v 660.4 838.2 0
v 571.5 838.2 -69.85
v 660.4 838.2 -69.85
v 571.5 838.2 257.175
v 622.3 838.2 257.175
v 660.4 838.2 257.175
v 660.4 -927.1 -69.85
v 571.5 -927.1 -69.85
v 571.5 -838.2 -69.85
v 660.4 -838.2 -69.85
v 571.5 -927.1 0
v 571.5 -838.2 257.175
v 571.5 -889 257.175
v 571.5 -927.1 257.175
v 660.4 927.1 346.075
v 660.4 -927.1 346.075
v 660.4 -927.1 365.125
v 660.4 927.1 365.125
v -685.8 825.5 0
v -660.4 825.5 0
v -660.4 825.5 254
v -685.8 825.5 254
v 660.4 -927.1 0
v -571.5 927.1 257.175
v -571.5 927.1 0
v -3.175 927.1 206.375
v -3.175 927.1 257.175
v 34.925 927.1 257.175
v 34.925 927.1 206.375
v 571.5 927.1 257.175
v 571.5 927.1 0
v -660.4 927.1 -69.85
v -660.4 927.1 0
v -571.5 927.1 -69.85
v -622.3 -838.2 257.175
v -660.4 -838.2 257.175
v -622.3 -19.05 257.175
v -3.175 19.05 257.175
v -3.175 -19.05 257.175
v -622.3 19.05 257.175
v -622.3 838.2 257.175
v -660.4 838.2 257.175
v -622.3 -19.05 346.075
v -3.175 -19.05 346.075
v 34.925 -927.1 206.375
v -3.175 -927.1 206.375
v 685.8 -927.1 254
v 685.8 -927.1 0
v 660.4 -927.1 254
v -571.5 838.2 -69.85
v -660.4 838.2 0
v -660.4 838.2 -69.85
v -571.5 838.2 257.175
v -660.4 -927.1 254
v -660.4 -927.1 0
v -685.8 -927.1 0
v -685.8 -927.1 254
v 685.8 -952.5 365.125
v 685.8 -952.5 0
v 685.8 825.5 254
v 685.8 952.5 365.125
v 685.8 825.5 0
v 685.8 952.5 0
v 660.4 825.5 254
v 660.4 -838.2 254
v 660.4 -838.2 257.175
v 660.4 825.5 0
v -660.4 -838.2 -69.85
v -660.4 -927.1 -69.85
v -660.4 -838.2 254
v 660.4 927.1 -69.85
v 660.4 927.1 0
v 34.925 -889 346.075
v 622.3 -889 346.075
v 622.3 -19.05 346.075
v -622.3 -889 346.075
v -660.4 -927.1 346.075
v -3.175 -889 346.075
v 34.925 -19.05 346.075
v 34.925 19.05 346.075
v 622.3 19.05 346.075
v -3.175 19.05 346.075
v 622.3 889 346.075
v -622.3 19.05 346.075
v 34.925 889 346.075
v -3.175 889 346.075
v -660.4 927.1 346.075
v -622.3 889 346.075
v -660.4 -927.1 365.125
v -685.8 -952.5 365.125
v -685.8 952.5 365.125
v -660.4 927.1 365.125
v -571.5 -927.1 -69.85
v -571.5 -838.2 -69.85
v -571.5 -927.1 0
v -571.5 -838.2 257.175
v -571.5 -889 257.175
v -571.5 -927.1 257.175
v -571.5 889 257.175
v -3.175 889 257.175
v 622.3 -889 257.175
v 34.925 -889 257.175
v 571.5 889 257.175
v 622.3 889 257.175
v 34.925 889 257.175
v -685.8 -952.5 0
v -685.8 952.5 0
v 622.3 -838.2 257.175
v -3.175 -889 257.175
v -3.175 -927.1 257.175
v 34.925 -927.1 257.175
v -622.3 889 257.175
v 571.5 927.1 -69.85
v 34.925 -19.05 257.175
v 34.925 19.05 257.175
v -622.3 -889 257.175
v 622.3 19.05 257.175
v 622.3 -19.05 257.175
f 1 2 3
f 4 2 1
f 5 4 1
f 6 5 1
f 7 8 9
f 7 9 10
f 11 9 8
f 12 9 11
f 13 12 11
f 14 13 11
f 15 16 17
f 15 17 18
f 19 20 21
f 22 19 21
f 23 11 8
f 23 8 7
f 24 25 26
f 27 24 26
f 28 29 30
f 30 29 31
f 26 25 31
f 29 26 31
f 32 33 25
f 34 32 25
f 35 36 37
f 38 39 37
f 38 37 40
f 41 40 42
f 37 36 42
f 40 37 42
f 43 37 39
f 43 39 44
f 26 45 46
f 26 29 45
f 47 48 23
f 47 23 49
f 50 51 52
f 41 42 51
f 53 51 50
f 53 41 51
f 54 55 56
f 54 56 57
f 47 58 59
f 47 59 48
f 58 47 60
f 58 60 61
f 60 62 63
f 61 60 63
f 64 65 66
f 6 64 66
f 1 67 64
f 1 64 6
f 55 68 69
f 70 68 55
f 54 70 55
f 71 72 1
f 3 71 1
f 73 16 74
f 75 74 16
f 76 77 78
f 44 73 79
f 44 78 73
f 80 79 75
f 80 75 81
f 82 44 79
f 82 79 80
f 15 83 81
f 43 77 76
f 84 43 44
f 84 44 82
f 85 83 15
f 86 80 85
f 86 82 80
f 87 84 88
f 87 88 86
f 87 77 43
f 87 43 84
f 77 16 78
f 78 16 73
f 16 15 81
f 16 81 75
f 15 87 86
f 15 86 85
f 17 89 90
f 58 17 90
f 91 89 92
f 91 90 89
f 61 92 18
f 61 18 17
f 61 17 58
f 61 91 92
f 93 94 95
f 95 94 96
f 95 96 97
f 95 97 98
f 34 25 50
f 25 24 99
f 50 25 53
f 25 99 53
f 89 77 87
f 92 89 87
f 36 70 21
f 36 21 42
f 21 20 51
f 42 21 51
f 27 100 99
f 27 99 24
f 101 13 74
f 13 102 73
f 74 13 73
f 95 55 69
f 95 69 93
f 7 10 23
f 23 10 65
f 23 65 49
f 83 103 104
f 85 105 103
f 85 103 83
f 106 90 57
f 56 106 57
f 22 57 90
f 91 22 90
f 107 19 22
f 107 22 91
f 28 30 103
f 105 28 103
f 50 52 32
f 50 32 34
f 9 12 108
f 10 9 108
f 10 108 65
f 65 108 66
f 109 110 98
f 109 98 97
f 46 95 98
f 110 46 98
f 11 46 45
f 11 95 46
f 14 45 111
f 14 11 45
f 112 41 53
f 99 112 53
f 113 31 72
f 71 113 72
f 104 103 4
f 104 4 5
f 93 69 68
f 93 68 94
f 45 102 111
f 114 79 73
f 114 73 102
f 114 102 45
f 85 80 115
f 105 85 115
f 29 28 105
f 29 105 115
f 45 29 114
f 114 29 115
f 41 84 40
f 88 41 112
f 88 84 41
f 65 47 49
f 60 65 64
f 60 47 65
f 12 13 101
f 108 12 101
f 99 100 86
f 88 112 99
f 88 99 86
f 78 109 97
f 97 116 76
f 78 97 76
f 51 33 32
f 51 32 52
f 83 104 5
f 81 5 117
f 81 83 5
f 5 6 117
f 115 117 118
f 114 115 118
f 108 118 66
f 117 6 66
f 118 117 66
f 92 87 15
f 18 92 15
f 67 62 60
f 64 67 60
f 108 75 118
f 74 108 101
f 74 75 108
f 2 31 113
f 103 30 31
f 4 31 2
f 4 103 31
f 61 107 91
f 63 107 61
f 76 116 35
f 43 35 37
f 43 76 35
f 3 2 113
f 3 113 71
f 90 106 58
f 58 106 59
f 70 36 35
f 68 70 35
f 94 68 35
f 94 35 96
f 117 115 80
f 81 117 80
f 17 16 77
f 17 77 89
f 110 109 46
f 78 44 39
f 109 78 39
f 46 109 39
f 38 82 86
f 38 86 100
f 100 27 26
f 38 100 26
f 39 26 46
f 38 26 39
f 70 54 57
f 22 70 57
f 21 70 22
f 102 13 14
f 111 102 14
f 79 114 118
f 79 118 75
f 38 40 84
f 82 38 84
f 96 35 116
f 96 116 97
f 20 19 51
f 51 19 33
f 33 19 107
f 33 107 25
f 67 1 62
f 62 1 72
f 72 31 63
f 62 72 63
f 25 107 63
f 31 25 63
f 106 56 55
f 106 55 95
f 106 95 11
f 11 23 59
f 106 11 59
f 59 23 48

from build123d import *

# Parameters (mm, degrees)
F0_W      = 1371.6
F0_H      = 1905
F0_W_2    = 1320.8
F0_H_2    = 1854.2
F1_DEPTH  = 365.125
F2_W      = 38.1
F2_H      = 139.7
F3_DEPTH  = 1854.2
F4_W      = 1854.2
F4_H      = 88.9
F5_DEPTH  = 38.1
F6_W      = 1854.2
F6_H      = 88.9
F7_DEPTH  = 38.1
F8_W      = 1752.6
F8_H      = 254
F9_DEPTH  = 1371.601
F10_DEPTH = 1752.6
F11_W     = 38.1
F11_H     = 88.9
F12_DEPTH = 1270
F13_W     = 38.1
F13_H     = 88.9
F14_DEPTH = 1270
F15_W     = 38.1
F15_H     = 88.9
F16_DEPTH = 1270
F17_W     = 88.9
F17_H     = 88.9
F18_DEPTH = 327.025
F19_W     = 88.9
F19_H     = 88.9
F20_DEPTH = 327.025
F21_W     = 88.9
F21_H     = 88.9
F22_DEPTH = 327.025
F23_W     = 88.9
F23_H     = 88.9
F24_DEPTH = 327.025


with BuildPart() as f1:
    # F0 (on Top) → F1 (new body)
    with BuildSketch(Plane.XY):
        Rectangle(F0_W, F0_H)
        Rectangle(F0_W_2, F0_H_2, mode=Mode.SUBTRACT)
    extrude(amount=F1_DEPTH)

    # F2 (on face) → F3 (join, through all)
    with BuildSketch(Plane.XZ.offset(-927.1)):
        with Locations((15.875, 276.225)):
            Rectangle(F2_W, F2_H)
    extrude(amount=F3_DEPTH)

    # F4 (on face) → F5 (join)
    with BuildSketch(Plane.YZ.offset(-660.4)):
        with Locations((0, 301.625)):
            Rectangle(F4_W, F4_H)
    extrude(amount=F5_DEPTH)

    # F6 (on face) → F7 (join)
    with BuildSketch(Plane(origin=(660.4, 0, 0), x_dir=(0, -1, 0), z_dir=(-1, 0, 0))):
        with Locations((0, 301.625)):
            Rectangle(F6_W, F6_H)
    extrude(amount=F7_DEPTH)

    # F8 (on face) → F9 (cut, through all)
    with BuildSketch(Plane.YZ.offset(685.8)):
        with Locations((-50.8, 127)):
            Rectangle(F8_W, F8_H)
    extrude(amount=-F9_DEPTH, mode=Mode.SUBTRACT)

    # F10 (add, through all): a face of the model
    f10_faces = [f1.faces().sort_by_distance(p)[0] for p in [
        (15.875, 825.5, 230.1875),
    ]]
    extrude(f10_faces, amount=F10_DEPTH)

    # F11 (on face) → F12 (join)
    with BuildSketch(Plane.YZ.offset(-622.3)):
        with Locations((908.05, 301.625)):
            Rectangle(F11_W, F11_H)
    extrude(amount=F12_DEPTH)

    # F13 (on face) → F14 (join)
    with BuildSketch(Plane.YZ.offset(-622.3)):
        with Locations((-908.05, 301.625)):
            Rectangle(F13_W, F13_H)
    extrude(amount=F14_DEPTH)

    # F15 (on face) → F16 (join)
    with BuildSketch(Plane.YZ.offset(-622.3)):
        with Locations((0, 301.625)):
            Rectangle(F15_W, F15_H)
    extrude(amount=F16_DEPTH)

    # F17 (on face) → F18 (join)
    with BuildSketch(Plane(origin=(0, 0, 257.175), x_dir=(1, 0, 0), z_dir=(0, 0, -1))):
        with Locations((-615.95, 882.65)):
            Rectangle(F17_W, F17_H)
    extrude(amount=F18_DEPTH)

    # F19 (on face) → F20 (join)
    with BuildSketch(Plane(origin=(0, 0, 257.175), x_dir=(1, 0, 0), z_dir=(0, 0, -1))):
        with Locations((615.95, 882.65)):
            Rectangle(F19_W, F19_H)
    extrude(amount=F20_DEPTH)

    # F21 (on face) → F22 (join)
    with BuildSketch(Plane(origin=(0, 0, 257.175), x_dir=(1, 0, 0), z_dir=(0, 0, -1))):
        with Locations((-615.95, -882.65)):
            Rectangle(F21_W, F21_H)
    extrude(amount=F22_DEPTH)

    # F23 (on face) → F24 (join)
    with BuildSketch(Plane(origin=(0, 0, 257.175), x_dir=(1, 0, 0), z_dir=(0, 0, -1))):
        with Locations((615.95, -882.65)):
            Rectangle(F23_W, F23_H)
    extrude(amount=F24_DEPTH)


solid = f1.part
